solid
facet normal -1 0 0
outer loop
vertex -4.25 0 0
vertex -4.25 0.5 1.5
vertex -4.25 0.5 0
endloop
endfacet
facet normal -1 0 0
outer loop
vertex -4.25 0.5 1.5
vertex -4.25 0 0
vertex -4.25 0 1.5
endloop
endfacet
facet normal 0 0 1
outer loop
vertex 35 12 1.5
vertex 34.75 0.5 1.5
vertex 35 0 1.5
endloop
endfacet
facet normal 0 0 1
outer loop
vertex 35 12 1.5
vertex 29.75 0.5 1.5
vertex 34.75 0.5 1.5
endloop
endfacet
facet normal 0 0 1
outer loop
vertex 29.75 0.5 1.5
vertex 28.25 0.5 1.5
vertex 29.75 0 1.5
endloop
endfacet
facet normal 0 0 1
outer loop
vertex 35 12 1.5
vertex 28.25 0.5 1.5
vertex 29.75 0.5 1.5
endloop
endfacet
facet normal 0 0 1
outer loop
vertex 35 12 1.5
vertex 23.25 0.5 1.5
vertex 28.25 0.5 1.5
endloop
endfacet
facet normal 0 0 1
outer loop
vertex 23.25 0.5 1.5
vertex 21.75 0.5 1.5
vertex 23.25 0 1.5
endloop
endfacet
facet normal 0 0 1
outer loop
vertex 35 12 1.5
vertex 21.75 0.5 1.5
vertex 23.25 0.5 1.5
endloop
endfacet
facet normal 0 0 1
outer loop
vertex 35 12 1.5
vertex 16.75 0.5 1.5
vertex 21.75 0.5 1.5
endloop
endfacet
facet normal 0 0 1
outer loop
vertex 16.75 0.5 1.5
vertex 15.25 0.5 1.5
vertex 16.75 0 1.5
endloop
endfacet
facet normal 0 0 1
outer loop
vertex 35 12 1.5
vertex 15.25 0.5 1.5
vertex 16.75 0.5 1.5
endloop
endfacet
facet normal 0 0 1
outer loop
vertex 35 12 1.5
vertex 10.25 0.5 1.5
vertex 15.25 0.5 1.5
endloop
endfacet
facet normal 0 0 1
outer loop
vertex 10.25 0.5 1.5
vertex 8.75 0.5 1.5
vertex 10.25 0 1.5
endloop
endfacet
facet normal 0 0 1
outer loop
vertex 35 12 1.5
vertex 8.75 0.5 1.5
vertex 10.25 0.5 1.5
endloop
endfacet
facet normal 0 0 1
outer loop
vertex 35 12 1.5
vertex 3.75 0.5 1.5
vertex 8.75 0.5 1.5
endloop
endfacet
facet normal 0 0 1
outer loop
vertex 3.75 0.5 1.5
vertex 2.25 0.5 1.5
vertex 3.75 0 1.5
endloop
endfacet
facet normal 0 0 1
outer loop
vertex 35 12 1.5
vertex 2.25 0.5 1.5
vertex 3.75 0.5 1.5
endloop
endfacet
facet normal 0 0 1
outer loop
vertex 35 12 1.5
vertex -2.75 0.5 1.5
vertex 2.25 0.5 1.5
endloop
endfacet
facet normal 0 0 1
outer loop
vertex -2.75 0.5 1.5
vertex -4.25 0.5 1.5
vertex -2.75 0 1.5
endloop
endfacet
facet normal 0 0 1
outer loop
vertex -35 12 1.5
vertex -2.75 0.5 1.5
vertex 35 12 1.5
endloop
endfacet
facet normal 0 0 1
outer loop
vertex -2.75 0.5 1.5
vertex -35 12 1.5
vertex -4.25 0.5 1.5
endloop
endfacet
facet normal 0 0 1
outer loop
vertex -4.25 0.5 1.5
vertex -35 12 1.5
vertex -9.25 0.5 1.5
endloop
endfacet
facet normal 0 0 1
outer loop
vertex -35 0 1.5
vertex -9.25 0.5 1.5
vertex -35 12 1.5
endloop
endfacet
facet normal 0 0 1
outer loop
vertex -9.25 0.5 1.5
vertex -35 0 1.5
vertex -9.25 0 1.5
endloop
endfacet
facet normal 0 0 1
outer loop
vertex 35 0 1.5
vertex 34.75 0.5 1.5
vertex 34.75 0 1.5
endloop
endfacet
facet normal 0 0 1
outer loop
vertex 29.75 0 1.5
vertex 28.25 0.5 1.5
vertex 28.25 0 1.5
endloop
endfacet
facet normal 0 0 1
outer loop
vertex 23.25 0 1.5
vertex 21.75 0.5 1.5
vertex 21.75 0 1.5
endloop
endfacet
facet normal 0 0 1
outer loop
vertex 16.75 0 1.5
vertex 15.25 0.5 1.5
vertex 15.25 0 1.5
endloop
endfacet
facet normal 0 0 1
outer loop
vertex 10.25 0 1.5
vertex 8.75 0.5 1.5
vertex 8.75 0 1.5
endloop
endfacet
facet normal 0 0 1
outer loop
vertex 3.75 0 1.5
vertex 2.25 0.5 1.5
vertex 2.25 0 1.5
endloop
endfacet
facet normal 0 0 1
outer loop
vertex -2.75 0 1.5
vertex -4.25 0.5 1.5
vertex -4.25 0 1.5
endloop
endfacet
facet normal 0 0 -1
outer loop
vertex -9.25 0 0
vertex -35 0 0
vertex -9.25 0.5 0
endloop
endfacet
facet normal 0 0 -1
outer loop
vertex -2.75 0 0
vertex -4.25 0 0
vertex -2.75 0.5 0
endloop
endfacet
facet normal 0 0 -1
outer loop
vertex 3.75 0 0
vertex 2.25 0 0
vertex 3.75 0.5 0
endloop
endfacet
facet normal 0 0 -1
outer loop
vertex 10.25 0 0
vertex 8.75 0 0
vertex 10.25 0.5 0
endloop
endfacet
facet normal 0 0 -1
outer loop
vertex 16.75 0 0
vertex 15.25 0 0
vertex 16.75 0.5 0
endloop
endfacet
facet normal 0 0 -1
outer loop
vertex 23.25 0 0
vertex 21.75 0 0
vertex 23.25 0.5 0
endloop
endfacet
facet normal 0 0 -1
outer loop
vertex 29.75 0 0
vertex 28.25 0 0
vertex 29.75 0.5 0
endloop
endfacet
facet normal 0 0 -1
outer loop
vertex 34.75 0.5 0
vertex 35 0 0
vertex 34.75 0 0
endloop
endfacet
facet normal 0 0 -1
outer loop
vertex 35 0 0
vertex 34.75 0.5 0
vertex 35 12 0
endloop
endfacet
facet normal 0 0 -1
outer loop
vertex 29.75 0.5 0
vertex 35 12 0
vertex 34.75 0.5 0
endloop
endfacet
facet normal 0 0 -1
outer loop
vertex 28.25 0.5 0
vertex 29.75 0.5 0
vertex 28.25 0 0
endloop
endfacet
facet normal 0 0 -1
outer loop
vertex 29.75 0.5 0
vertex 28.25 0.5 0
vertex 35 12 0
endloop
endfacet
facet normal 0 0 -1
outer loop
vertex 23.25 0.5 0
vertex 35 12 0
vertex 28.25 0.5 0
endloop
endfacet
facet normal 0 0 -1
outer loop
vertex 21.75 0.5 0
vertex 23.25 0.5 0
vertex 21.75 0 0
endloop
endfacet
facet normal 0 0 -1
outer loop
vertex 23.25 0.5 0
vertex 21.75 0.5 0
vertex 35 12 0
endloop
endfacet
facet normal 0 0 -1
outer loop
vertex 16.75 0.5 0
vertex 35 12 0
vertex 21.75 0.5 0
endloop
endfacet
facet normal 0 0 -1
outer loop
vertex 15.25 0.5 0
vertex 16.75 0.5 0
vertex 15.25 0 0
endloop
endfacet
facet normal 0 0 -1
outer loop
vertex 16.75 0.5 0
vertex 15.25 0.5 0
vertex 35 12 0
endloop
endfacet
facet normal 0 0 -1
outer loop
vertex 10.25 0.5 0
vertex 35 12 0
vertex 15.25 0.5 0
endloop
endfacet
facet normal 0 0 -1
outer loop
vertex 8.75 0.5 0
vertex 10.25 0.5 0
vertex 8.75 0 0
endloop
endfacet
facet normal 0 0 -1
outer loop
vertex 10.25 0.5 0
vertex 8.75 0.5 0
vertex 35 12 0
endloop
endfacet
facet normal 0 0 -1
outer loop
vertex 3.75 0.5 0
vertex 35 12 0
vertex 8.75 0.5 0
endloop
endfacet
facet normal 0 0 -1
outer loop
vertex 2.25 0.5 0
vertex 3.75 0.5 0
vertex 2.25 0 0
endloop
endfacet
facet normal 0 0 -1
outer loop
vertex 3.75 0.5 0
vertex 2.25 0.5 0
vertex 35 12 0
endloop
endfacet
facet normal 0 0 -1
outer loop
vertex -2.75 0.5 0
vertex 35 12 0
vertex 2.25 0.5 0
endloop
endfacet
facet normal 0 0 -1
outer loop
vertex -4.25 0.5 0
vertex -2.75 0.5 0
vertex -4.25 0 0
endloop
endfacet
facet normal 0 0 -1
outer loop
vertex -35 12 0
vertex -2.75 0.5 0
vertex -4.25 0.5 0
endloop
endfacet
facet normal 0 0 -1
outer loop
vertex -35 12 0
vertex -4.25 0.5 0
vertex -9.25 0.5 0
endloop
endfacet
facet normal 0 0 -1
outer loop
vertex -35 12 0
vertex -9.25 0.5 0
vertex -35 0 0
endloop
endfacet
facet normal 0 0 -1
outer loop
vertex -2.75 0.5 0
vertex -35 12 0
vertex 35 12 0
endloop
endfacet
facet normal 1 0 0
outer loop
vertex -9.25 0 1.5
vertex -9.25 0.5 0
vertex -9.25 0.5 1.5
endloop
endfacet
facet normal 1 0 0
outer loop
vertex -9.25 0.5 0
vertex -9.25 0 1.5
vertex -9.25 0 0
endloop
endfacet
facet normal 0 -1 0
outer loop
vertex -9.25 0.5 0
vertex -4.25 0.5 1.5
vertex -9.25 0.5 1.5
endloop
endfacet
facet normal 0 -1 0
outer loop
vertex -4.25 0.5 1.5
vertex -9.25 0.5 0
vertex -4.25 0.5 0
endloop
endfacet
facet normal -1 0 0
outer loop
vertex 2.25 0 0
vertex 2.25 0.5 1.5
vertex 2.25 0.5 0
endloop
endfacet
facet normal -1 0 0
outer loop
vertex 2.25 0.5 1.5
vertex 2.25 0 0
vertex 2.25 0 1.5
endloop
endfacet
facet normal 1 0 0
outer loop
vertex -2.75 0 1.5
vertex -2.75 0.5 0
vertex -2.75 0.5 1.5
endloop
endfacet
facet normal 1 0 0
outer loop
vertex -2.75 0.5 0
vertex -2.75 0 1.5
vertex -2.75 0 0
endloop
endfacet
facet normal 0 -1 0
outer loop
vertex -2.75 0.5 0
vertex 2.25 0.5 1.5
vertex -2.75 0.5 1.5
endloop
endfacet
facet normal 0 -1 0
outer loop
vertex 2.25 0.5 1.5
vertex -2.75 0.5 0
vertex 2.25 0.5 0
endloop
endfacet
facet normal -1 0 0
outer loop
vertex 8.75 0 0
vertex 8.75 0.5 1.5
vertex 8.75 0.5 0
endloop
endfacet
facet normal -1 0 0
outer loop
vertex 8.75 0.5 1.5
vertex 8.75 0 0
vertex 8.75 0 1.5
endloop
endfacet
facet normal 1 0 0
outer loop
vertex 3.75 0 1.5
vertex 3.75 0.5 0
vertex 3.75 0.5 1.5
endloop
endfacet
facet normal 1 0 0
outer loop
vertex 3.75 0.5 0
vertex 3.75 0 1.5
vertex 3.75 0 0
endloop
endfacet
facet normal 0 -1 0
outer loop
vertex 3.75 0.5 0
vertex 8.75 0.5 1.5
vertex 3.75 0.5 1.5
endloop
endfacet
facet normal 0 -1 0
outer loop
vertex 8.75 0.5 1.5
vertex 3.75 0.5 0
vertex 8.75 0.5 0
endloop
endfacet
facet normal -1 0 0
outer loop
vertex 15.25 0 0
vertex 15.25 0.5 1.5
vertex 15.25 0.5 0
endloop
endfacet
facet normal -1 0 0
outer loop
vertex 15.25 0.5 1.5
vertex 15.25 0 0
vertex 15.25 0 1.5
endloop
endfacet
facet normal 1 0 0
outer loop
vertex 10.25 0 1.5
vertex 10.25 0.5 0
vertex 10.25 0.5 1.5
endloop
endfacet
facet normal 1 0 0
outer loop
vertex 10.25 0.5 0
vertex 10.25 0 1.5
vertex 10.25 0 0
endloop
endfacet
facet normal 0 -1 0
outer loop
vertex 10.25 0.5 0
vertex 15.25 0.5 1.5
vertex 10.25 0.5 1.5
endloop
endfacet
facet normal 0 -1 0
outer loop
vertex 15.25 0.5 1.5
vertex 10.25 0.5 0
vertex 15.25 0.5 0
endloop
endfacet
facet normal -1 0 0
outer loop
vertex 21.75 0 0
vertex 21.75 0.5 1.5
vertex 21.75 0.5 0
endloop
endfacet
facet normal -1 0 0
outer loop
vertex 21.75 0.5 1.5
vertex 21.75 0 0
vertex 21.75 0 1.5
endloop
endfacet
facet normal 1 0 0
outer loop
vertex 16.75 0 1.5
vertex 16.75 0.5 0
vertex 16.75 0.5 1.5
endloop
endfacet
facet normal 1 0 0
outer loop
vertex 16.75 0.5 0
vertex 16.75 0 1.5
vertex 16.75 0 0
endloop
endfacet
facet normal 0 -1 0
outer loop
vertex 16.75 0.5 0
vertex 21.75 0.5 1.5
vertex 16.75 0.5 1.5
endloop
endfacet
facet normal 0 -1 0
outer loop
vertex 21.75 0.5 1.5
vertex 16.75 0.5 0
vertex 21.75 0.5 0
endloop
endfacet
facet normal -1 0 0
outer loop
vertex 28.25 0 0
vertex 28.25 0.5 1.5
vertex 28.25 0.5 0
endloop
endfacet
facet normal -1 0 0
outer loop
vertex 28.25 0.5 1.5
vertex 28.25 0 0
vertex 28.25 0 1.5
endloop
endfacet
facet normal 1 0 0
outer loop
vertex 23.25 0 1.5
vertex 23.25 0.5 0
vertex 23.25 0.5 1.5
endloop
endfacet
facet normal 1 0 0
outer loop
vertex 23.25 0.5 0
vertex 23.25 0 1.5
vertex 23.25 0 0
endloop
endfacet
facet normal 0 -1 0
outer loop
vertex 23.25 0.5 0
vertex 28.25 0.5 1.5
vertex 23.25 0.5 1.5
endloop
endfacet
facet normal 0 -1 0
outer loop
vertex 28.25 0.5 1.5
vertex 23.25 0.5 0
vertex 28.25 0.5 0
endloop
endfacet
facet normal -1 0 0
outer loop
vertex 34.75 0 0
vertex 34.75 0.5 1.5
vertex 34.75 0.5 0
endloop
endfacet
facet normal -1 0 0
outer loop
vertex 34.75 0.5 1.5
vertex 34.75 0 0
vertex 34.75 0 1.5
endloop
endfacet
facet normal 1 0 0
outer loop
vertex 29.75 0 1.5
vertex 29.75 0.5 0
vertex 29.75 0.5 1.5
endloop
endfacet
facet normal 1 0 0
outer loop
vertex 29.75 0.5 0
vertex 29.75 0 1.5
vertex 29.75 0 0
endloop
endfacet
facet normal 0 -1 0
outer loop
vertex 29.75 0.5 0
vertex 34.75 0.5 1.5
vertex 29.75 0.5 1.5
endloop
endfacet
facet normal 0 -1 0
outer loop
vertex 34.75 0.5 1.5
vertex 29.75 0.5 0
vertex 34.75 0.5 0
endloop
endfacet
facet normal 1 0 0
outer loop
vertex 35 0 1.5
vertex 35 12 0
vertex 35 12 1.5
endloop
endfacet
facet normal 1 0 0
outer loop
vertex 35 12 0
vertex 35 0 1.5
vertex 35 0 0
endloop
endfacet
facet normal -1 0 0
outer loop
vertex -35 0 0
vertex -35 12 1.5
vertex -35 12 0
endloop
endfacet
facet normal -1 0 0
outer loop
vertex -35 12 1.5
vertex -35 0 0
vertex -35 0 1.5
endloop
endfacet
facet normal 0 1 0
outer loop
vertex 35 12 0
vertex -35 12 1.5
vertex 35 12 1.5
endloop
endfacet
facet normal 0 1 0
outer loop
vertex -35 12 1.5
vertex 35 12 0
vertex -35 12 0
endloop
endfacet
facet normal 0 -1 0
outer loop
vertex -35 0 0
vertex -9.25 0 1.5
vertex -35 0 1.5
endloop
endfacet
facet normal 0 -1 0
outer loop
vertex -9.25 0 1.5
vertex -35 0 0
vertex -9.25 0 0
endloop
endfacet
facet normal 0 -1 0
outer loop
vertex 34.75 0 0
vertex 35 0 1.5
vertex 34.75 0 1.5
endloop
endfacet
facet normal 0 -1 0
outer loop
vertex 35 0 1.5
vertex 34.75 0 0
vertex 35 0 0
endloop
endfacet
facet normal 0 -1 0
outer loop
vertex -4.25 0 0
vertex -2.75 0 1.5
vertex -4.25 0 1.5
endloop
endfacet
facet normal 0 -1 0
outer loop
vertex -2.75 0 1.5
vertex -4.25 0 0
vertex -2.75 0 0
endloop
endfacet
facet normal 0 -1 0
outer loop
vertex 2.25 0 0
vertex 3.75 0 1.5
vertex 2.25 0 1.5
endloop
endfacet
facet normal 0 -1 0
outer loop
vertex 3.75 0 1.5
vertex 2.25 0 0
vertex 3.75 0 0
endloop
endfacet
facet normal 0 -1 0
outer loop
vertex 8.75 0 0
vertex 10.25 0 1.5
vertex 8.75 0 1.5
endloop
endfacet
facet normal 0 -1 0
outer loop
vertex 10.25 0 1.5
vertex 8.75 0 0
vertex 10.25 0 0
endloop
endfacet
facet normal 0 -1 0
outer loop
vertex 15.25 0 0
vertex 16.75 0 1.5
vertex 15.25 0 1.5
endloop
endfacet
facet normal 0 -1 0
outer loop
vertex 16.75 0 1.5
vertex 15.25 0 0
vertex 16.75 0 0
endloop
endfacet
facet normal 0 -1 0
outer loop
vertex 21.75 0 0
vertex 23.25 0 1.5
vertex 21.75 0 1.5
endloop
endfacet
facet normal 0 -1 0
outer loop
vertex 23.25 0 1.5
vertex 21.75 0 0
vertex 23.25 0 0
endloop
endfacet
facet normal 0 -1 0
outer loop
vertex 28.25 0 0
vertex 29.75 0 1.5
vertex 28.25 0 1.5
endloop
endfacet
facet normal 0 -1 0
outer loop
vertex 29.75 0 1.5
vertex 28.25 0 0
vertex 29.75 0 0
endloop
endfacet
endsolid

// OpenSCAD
// 10-well agarose gel comb - printed lying flat
// Units: mm

$fn = 64;

// ---- Dimensions ----
spine_len    = 70;    // spine length (X)
spine_wid    = 12;    // spine width (Y)
teeth_count  = 10;    // number of teeth
tooth_w      = 5.0;   // tooth width (X)
tooth_len    = 12;    // tooth length (Y)
gap          = 1.5;   // gap between teeth (X)
plate_t      = 1.5;   // plate thickness (Z)

eps          = 0.5;   // cutter overshoot

// ---- Derived ----
pitch        = tooth_w + gap;
row_span     = (teeth_count - 1) * gap;
x_start      = -row_span / 2;   // centre row on spine

// ---- Model ----
difference() {
    // Spine
    translate([-spine_len/2, 0, 0])
        cube([spine_len, spine_wid, plate_t]);

    // Teeth (extend past -Y face)
    for (i = [0 : teeth_count - 1])
        translate([x_start + i * pitch - tooth_w/2,
                   -tooth_len,
                   0])
            cube([tooth_w, tooth_len + eps, plate_t]);
}
